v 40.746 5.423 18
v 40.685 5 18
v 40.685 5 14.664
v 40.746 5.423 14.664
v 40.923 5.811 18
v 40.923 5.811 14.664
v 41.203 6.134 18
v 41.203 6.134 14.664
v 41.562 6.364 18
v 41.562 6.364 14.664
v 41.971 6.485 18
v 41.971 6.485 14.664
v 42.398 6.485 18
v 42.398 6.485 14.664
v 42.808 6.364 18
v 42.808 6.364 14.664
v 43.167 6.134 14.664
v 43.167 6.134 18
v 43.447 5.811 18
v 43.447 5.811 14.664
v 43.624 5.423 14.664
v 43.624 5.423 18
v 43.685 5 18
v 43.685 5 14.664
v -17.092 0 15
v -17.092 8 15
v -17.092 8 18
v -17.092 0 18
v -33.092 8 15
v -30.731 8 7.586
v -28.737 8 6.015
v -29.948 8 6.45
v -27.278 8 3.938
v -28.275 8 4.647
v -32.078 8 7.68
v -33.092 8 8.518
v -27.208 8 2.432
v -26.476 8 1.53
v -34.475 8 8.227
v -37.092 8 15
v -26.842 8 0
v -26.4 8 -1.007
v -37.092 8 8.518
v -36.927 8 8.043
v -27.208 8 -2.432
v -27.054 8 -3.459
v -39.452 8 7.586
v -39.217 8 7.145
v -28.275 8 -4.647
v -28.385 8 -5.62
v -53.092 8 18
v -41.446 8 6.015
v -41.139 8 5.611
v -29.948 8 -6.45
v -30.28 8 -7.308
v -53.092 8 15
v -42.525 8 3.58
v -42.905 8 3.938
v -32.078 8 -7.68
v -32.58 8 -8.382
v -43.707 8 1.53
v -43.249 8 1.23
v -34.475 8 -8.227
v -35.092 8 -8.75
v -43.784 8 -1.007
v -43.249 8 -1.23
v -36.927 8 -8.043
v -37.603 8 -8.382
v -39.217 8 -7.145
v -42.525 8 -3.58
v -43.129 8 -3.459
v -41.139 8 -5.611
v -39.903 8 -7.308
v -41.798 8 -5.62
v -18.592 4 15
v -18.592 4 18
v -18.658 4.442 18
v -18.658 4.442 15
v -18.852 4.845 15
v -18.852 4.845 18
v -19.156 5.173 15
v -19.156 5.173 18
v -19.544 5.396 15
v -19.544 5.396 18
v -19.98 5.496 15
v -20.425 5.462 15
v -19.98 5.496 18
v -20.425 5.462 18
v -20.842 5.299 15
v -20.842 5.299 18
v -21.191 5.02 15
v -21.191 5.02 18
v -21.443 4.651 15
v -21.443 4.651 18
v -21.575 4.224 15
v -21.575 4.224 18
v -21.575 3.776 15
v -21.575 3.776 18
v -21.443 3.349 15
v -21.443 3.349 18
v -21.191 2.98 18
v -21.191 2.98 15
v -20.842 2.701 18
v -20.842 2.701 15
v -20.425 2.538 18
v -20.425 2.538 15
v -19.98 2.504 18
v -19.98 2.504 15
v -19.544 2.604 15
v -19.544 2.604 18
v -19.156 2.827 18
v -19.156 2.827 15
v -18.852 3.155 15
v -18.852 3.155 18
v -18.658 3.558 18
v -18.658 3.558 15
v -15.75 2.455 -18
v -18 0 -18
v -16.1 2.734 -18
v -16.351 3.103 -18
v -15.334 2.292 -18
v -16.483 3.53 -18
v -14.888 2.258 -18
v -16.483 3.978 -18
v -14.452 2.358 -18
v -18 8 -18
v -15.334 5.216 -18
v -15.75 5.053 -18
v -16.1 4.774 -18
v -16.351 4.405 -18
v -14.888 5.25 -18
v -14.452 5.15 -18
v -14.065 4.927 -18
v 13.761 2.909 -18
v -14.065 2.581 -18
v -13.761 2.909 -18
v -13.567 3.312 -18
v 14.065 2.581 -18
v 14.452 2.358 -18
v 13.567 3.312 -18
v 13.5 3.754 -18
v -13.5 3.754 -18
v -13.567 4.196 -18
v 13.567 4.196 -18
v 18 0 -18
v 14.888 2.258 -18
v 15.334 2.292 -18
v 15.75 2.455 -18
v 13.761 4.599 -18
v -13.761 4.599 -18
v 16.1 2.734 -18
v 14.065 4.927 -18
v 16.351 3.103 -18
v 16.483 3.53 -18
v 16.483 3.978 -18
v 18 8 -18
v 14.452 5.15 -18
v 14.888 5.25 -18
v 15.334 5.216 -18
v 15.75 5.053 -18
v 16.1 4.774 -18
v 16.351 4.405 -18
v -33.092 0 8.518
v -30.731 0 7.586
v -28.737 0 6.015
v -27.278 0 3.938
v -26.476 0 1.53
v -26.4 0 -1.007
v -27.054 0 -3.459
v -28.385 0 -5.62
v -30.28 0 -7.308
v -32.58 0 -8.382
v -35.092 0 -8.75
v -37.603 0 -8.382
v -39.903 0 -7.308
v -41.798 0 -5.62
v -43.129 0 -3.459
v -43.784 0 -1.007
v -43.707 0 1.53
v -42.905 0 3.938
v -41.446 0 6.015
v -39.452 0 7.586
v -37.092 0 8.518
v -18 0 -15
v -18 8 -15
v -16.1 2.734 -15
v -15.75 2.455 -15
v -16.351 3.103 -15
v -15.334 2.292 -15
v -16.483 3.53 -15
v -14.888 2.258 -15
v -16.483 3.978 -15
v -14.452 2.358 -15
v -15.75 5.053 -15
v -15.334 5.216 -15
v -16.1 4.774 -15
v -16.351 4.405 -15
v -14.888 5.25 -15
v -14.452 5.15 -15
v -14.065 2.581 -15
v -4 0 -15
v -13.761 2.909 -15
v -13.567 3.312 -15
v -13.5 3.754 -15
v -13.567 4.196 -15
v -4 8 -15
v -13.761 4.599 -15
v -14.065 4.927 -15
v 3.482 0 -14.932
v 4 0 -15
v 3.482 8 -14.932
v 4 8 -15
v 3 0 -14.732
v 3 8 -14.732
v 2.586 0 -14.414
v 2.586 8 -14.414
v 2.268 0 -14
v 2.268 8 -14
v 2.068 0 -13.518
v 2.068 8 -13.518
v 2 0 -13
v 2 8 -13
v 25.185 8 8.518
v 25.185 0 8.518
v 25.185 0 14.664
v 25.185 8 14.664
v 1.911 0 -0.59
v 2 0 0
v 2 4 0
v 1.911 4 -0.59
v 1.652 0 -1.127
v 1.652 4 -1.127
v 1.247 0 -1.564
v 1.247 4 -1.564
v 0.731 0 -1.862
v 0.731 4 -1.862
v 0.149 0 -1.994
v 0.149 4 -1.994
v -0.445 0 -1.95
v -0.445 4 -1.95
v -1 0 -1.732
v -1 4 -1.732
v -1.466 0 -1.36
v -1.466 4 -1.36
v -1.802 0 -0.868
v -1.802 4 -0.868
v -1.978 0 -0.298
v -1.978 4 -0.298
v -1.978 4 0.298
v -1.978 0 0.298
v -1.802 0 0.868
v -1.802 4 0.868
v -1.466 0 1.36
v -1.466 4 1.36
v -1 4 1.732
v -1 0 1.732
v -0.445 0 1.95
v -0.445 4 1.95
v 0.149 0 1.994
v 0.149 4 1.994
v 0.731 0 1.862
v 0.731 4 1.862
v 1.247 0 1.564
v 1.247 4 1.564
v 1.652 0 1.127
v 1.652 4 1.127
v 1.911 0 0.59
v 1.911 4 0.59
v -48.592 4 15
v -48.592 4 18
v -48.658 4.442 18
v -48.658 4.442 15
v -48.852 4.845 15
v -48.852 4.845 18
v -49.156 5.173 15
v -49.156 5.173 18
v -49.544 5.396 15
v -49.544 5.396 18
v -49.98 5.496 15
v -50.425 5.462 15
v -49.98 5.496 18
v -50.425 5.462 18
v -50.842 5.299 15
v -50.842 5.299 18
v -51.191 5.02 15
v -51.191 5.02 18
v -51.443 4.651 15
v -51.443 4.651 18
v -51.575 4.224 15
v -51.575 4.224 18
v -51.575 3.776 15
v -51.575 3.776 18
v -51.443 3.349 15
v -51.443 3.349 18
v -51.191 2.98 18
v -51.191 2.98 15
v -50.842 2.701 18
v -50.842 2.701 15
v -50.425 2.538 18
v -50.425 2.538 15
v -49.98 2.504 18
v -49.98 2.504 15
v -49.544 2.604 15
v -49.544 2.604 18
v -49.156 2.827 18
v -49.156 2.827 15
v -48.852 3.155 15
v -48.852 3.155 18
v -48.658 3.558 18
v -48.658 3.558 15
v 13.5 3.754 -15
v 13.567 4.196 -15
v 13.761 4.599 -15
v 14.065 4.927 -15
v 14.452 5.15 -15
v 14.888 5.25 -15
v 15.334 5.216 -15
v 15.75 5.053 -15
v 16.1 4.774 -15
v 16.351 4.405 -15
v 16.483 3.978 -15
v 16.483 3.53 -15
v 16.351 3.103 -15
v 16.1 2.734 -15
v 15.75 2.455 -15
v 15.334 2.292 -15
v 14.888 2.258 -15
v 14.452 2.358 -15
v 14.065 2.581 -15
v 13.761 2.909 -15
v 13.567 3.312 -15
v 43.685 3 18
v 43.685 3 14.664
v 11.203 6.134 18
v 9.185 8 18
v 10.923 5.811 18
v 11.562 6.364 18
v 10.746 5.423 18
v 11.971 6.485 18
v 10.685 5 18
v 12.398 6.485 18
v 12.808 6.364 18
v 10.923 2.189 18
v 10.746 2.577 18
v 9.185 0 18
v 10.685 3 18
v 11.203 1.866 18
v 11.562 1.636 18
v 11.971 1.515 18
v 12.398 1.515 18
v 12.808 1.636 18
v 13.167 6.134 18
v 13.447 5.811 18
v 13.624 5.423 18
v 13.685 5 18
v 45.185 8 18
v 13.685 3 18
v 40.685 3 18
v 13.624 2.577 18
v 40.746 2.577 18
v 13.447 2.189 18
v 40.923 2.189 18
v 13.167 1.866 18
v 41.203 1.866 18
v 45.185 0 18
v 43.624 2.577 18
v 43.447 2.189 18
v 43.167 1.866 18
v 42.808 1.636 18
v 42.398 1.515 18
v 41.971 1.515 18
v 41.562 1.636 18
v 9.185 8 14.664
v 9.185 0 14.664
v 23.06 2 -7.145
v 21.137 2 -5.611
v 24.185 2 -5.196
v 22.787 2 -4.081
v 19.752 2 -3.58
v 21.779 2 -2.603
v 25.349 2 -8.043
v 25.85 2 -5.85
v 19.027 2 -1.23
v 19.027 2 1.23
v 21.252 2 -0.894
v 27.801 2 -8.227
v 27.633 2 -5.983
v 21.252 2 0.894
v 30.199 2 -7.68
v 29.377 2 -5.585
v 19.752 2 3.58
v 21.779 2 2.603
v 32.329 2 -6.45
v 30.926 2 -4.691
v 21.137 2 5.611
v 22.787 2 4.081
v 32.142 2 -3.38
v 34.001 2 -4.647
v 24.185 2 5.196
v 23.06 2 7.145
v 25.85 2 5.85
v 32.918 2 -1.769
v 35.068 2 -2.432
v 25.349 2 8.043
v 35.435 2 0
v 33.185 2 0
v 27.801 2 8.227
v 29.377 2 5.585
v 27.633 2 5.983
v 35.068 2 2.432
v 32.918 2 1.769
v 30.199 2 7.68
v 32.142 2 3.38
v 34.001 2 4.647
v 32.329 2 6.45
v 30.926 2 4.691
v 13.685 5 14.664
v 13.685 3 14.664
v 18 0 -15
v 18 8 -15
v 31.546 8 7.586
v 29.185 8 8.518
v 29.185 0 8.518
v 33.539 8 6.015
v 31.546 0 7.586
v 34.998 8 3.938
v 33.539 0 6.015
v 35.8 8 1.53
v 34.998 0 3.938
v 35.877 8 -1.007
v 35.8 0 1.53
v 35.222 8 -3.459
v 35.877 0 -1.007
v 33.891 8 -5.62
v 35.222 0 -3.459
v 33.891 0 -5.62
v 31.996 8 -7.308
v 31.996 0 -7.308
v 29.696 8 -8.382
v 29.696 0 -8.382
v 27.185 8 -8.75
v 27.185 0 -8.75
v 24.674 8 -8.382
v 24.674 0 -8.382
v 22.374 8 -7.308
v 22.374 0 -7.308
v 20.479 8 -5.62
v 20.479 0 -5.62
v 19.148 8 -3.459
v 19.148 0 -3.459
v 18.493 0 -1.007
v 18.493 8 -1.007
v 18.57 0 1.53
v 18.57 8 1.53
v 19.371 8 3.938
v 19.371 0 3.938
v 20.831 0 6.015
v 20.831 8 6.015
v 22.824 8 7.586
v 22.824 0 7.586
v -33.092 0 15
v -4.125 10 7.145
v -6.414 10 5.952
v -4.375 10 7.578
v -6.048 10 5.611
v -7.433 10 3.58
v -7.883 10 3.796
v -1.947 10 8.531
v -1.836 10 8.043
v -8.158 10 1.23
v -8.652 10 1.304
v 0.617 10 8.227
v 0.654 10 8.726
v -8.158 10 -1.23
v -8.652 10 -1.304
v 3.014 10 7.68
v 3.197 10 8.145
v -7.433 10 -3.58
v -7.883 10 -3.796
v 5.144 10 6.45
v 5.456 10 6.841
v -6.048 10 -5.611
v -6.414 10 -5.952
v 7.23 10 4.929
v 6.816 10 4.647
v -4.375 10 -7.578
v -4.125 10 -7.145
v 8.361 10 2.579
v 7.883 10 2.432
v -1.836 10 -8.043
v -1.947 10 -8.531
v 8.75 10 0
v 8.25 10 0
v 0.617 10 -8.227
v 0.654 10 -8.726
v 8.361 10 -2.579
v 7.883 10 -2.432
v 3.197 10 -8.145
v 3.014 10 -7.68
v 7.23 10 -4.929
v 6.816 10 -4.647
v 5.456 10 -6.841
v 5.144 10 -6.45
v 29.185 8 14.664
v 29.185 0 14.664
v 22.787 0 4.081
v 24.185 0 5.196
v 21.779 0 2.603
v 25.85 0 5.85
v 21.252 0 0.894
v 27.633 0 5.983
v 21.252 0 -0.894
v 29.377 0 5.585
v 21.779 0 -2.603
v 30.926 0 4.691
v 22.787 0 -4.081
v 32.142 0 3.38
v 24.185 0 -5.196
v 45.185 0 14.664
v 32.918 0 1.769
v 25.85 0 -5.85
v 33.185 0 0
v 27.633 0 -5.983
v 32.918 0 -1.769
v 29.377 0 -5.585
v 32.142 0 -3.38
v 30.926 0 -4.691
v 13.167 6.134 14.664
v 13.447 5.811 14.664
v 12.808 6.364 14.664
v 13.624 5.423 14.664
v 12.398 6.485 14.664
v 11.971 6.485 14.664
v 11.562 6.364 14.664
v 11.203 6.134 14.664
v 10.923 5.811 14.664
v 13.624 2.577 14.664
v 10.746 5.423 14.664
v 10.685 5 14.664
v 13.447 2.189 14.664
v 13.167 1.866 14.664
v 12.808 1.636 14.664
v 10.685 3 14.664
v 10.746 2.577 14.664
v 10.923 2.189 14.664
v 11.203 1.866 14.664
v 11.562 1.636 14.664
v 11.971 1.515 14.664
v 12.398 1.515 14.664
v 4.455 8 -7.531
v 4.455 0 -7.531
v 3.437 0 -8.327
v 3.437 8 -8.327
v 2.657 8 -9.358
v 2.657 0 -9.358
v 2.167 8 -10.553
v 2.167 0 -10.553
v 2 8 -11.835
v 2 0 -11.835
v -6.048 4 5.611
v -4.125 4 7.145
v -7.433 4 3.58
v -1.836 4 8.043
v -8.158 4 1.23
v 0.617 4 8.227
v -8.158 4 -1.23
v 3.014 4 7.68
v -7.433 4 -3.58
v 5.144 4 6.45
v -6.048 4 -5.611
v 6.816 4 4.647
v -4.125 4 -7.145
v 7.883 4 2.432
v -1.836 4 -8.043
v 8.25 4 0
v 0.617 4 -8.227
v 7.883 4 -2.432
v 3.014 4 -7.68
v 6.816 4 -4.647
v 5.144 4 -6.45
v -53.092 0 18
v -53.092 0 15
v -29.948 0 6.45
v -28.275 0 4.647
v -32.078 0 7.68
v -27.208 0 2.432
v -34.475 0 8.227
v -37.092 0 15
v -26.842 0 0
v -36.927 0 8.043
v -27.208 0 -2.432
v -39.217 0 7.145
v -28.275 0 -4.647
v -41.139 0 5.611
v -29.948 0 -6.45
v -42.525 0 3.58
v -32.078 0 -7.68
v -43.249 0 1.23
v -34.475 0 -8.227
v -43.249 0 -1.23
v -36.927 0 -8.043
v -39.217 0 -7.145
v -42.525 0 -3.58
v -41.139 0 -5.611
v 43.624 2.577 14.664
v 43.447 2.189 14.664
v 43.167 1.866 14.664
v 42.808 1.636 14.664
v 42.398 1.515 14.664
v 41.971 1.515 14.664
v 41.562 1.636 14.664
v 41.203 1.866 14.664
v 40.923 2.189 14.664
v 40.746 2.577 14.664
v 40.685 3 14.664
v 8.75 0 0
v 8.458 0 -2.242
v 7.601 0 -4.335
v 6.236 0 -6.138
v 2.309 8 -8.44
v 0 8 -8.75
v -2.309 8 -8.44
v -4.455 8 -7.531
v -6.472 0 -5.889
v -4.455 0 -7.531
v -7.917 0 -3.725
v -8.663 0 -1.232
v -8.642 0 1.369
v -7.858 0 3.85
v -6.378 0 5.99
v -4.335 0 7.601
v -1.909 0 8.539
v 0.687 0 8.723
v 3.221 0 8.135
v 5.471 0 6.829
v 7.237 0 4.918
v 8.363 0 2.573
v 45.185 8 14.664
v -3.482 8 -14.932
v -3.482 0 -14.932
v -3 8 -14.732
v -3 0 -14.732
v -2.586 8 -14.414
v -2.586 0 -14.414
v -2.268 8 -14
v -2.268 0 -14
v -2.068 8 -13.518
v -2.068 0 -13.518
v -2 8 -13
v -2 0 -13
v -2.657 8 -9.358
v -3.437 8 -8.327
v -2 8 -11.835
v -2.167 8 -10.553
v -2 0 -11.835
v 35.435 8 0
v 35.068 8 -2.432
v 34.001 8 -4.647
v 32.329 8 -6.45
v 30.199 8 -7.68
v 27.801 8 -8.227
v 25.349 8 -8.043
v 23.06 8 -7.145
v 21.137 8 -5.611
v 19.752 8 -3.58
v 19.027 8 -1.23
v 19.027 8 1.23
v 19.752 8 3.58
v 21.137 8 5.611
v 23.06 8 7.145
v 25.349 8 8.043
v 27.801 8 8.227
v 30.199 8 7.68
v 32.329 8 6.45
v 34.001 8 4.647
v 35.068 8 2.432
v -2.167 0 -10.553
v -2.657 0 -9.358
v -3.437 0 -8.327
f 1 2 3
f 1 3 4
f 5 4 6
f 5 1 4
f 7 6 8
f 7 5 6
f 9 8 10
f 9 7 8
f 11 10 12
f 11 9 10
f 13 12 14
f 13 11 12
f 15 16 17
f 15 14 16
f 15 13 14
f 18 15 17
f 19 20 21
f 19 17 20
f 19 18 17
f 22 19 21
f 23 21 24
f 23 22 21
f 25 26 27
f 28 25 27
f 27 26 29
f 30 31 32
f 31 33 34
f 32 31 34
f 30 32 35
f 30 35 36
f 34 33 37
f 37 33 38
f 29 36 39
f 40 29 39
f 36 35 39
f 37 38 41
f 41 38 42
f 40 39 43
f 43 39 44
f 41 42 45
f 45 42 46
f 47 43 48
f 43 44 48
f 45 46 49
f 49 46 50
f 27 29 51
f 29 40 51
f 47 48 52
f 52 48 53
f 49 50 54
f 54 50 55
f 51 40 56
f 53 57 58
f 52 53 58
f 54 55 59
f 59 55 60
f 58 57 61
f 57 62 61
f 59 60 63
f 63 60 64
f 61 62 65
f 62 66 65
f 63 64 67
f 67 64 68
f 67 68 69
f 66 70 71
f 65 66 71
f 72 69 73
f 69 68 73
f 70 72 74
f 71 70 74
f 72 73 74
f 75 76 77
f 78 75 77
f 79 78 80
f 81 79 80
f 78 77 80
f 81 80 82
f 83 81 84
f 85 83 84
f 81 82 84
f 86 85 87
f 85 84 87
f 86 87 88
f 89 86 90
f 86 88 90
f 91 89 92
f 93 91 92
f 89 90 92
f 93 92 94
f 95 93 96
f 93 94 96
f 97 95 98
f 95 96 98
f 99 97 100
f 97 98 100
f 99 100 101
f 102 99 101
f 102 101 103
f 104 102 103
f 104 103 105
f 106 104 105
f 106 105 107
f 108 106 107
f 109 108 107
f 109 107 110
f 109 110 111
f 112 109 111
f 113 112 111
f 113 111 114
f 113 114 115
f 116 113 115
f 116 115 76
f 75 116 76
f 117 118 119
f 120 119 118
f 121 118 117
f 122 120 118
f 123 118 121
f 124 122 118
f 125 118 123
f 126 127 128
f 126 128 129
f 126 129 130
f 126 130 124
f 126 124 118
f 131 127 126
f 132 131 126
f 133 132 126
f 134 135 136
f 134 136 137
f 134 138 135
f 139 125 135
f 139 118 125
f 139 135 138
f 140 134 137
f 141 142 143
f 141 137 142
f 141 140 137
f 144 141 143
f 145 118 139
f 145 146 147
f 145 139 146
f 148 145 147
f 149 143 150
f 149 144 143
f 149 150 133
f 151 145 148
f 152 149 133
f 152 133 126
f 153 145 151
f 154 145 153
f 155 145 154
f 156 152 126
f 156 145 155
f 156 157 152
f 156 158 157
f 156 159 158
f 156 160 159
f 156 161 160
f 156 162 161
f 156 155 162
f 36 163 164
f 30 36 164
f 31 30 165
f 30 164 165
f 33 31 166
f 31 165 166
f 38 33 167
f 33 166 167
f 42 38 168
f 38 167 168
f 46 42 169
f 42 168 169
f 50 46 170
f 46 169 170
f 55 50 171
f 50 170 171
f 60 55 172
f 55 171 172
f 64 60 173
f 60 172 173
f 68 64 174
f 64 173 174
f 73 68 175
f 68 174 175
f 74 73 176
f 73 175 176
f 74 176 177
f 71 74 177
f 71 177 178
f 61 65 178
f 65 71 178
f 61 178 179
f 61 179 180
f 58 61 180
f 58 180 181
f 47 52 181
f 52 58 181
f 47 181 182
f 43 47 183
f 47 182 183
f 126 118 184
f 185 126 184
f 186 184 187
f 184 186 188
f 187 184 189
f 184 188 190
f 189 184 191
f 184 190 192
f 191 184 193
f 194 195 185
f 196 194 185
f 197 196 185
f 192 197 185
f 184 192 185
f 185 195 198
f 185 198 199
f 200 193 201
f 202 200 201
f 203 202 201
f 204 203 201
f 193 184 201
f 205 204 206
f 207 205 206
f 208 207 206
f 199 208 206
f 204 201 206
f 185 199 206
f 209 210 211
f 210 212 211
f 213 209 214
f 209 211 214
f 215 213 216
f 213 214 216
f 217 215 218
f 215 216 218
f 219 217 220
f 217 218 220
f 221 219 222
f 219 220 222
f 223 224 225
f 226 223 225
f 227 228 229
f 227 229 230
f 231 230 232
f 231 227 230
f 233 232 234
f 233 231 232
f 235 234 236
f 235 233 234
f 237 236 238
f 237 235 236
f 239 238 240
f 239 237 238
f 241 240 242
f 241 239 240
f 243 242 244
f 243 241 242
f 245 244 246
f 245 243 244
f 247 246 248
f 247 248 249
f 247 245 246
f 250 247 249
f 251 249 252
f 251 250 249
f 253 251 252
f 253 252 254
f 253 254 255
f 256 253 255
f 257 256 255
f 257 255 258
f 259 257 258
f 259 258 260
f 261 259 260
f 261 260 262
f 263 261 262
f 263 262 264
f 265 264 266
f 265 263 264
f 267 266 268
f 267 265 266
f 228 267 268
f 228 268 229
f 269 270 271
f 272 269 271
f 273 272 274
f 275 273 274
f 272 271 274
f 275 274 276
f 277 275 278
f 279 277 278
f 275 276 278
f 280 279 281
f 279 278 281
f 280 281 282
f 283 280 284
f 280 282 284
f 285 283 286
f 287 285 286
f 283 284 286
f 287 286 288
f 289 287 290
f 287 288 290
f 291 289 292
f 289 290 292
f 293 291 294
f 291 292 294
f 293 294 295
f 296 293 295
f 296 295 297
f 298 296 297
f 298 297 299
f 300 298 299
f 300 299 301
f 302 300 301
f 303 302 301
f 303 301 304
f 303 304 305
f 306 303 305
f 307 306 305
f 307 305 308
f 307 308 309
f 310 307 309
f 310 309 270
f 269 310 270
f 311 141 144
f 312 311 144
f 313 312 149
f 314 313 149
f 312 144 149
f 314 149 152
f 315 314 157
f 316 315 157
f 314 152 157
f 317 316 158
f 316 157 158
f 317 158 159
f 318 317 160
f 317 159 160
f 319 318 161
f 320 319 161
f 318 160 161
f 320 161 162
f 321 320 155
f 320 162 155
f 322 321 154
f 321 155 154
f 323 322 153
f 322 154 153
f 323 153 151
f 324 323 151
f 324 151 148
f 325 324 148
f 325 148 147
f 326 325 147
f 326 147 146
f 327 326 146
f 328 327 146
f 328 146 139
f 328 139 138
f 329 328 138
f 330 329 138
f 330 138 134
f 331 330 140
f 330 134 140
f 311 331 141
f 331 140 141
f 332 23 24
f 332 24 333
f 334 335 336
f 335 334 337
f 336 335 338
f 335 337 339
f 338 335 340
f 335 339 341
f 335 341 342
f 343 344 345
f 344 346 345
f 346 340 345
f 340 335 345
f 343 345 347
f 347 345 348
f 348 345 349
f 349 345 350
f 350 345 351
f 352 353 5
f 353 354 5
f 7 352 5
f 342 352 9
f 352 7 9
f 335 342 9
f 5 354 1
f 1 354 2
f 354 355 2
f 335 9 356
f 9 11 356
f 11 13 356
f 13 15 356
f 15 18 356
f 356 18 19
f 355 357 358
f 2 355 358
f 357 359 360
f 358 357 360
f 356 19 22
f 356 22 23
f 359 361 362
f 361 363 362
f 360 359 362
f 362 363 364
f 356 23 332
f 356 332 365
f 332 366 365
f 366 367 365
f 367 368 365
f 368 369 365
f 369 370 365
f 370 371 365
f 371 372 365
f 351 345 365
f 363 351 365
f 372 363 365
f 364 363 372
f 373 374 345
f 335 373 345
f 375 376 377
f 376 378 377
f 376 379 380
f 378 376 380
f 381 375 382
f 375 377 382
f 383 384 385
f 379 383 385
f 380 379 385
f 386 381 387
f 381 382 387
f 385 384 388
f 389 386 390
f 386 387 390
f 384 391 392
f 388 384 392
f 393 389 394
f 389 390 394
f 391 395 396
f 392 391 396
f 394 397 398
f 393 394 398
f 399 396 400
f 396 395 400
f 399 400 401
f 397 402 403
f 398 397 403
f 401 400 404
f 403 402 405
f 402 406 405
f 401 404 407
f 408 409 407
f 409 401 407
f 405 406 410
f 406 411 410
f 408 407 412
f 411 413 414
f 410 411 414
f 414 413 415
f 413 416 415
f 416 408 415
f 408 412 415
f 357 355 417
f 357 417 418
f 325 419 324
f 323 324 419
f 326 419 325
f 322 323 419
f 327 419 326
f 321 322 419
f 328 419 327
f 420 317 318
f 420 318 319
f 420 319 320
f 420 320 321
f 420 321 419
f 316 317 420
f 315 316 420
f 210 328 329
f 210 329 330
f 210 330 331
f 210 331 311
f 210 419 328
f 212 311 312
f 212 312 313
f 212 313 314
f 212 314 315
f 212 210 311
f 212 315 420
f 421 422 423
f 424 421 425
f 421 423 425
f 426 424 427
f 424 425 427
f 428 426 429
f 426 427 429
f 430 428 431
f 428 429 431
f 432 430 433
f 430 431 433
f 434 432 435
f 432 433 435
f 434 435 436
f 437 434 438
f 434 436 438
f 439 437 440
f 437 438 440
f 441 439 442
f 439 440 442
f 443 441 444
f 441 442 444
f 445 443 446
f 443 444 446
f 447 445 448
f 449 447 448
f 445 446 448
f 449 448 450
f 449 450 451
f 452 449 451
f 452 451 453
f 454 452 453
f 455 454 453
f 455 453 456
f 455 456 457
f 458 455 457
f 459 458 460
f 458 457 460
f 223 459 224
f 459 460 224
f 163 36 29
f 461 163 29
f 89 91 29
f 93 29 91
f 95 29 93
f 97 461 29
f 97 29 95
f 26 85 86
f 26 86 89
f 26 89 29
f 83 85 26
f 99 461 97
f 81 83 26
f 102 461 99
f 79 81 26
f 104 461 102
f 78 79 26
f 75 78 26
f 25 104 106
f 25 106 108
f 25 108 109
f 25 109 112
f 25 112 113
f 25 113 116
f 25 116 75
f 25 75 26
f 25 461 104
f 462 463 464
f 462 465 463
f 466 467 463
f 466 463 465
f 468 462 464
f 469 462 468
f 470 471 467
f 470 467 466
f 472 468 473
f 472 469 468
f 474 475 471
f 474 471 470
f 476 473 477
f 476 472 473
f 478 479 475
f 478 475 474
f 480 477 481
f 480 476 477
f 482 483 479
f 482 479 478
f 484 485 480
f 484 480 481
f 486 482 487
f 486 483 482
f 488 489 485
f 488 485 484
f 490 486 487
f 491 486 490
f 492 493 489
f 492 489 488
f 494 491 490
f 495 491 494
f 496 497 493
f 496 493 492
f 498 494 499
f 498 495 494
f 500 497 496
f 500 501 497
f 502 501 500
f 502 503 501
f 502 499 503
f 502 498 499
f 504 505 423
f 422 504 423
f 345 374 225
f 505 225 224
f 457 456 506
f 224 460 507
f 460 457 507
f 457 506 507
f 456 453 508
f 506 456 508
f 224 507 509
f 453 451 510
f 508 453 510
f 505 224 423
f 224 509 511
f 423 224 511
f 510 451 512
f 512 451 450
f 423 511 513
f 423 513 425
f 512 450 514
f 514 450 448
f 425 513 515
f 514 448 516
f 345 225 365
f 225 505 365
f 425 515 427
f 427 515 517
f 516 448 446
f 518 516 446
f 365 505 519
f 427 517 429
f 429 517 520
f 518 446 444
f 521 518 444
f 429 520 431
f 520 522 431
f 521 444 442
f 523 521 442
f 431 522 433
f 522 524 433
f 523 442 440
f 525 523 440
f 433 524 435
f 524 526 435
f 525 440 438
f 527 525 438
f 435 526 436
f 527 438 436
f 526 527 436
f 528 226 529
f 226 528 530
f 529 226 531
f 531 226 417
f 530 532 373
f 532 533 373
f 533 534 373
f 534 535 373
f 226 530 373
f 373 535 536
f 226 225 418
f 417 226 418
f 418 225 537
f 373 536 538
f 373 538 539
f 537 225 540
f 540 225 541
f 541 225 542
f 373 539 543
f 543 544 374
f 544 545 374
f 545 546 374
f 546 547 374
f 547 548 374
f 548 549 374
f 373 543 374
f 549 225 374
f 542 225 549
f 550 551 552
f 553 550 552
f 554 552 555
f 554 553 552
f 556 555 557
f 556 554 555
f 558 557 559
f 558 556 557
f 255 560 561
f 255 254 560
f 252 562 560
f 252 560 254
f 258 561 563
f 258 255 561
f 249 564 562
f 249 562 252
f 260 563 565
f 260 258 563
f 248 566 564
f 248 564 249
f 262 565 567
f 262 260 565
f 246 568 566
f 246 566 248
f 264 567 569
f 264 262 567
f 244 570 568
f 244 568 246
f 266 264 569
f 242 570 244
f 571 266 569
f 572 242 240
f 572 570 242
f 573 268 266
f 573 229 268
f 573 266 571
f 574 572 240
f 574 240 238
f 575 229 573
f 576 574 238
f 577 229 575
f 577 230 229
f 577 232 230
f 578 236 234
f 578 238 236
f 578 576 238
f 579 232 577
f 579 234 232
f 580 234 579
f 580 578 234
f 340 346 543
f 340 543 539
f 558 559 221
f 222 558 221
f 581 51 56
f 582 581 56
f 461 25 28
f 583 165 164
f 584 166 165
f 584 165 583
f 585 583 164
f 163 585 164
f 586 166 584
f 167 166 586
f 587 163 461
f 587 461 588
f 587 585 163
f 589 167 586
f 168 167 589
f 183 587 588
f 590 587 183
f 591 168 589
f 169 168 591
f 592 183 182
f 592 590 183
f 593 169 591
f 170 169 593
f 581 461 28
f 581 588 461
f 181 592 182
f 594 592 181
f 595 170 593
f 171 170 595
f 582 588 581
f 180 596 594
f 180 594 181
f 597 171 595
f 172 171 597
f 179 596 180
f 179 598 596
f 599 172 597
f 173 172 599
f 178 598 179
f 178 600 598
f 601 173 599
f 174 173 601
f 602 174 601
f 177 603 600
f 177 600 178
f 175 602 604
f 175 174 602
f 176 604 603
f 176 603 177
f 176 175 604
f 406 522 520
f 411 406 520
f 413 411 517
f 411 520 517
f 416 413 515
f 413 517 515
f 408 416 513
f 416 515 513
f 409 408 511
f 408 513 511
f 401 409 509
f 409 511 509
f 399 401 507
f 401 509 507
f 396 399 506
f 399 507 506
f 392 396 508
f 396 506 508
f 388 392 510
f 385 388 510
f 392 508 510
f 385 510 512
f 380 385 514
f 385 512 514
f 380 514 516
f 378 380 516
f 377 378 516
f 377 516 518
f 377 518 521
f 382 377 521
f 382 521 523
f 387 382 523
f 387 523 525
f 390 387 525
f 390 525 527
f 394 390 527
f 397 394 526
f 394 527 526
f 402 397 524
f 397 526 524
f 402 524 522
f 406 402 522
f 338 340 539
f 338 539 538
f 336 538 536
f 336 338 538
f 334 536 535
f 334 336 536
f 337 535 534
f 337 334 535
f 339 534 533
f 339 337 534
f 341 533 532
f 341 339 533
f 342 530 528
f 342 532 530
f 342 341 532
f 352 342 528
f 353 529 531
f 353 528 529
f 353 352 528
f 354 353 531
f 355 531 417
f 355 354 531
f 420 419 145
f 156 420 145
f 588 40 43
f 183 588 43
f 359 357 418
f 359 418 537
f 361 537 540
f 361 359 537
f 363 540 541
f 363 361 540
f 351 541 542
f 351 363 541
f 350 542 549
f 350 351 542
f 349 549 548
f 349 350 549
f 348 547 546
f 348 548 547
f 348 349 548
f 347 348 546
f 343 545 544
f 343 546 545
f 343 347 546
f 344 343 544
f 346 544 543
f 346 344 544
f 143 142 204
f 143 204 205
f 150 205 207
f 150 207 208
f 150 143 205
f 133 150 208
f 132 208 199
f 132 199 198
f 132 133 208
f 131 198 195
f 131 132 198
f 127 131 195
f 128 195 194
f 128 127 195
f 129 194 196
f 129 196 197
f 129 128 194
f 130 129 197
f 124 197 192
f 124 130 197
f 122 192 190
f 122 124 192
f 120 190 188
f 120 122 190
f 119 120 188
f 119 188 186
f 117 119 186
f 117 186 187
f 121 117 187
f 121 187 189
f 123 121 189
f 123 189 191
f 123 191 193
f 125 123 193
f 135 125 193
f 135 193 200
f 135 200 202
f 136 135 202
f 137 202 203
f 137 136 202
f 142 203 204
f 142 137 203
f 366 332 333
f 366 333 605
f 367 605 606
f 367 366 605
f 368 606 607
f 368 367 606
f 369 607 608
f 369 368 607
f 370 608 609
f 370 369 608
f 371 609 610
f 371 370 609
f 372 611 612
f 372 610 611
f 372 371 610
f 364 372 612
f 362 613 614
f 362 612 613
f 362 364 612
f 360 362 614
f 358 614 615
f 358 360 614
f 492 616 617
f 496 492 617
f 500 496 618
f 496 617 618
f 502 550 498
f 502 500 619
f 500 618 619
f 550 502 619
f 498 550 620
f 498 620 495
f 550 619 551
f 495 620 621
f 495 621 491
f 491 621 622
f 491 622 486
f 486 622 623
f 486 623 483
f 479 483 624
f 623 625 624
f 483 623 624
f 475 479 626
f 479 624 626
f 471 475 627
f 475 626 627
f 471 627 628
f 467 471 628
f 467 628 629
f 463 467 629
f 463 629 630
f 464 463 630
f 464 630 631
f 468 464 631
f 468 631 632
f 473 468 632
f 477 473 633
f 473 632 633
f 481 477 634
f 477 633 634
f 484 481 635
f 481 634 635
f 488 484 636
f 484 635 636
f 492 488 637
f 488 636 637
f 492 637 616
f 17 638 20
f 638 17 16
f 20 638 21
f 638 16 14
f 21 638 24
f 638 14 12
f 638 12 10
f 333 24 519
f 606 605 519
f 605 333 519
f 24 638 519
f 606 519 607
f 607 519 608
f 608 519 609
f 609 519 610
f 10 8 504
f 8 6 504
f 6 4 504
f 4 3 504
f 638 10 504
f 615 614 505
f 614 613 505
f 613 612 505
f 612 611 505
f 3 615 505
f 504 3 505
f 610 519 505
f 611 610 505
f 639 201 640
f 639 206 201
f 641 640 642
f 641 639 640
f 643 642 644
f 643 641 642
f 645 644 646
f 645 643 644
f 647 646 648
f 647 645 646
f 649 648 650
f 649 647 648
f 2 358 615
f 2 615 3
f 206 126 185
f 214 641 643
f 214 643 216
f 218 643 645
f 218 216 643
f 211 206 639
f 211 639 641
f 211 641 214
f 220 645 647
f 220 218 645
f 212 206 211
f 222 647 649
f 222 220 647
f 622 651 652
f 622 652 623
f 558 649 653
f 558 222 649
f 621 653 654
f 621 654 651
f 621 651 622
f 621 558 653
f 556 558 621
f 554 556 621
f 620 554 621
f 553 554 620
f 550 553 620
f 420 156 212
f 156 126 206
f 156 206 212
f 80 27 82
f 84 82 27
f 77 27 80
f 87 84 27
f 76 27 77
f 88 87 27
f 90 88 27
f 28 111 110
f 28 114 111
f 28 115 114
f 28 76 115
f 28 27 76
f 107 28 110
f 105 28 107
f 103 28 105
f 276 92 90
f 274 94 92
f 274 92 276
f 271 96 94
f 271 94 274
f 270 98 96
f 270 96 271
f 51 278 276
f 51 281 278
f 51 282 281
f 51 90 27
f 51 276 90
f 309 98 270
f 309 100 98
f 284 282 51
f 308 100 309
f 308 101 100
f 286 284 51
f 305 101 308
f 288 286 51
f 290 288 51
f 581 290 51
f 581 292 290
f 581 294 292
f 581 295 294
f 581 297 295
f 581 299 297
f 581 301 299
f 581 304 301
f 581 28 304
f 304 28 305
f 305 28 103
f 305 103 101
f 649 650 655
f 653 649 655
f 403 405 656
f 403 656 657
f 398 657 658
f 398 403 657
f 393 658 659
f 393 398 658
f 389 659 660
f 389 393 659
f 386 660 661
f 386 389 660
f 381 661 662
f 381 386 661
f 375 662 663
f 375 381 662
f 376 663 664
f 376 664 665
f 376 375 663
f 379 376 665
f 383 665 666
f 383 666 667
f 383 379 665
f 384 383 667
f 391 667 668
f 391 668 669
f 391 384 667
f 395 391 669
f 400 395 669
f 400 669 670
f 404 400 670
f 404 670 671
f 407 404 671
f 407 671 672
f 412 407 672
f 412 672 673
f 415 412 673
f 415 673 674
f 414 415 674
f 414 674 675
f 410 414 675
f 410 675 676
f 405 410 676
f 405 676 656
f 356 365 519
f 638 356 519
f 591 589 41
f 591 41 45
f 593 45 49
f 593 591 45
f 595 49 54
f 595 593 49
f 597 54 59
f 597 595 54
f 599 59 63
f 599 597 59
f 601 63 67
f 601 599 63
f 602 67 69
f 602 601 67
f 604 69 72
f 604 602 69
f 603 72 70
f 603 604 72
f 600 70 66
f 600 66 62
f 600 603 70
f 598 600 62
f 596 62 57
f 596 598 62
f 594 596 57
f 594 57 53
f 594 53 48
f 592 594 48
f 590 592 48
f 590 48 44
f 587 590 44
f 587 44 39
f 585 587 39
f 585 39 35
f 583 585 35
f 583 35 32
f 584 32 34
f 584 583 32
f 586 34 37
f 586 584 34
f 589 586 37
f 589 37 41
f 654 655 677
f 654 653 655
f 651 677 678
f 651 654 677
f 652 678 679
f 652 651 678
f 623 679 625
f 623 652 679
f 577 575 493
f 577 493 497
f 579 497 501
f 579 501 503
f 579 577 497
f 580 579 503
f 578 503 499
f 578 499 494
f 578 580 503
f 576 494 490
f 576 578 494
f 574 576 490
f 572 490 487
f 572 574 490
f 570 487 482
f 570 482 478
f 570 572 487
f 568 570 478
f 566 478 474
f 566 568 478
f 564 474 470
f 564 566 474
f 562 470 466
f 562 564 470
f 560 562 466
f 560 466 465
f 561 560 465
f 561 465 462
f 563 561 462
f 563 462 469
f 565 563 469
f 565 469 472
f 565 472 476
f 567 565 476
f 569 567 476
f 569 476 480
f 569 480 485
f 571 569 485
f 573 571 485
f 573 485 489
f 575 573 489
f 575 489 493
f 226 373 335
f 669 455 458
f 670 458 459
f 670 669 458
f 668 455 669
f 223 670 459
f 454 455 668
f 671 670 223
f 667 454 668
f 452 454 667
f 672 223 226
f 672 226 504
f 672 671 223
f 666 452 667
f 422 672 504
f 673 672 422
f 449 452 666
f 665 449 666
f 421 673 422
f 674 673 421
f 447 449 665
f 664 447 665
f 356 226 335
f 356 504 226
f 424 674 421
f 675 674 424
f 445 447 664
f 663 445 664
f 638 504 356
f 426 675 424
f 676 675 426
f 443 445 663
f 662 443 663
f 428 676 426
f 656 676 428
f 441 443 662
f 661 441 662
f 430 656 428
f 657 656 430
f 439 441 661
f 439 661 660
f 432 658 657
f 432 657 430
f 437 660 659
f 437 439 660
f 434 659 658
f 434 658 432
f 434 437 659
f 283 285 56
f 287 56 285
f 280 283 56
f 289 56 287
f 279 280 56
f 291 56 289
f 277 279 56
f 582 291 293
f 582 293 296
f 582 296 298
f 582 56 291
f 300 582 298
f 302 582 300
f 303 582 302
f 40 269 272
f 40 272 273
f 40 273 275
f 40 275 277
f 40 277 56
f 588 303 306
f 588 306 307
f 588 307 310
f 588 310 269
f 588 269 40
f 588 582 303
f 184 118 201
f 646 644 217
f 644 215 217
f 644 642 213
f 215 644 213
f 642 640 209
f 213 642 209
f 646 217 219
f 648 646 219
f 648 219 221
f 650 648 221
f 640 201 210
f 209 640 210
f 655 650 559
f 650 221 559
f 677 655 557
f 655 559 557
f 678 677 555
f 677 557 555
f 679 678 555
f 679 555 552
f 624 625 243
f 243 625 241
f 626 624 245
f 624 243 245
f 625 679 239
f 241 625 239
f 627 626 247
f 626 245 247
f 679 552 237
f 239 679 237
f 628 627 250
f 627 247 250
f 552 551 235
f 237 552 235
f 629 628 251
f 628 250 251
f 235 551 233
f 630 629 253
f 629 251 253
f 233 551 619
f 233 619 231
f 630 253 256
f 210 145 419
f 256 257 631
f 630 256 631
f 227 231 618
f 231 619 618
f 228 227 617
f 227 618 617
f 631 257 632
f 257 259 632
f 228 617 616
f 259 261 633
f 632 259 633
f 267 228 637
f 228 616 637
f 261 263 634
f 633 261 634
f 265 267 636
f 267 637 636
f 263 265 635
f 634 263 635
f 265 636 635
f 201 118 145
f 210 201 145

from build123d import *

# Parameters (mm, degrees)
SKETCH_1_R          = 8.75
SKETCH_1_R_2        = 8.25
EXTRUDE_2_DEPTH     = 10
SKETCH_2_R          = 8.25
SKETCH_2_R_2        = 2
EXTRUDE_3_DEPTH     = 4
EXTRUDE_4_DEPTH     = 8
SKETCH_5_W          = 3
SKETCH_5_H          = 8
EXTRUDE_5_DEPTH     = 3
SKETCH_6_W          = 3
SKETCH_6_H          = 8
EXTRUDE_6_DEPTH     = 3
SKETCH_7_R          = 1.5
CUT_EXTRUDE_1_DEPTH = 3
FILLET_1_R          = 5
FILLET_3_R          = 2
SKETCH_8_R          = 8.75
SKETCH_8_R_2        = 8.25
EXTRUDE_7_DEPTH     = 8
SKETCH_9_R          = 8.25
SKETCH_9_R_2        = 6
EXTRUDE_8_DEPTH     = 2
EXTRUDE_9_DEPTH     = 8
SKETCH_11_R         = 1.5
CUT_EXTRUDE_2_DEPTH = 8
CUT_EXTRUDE_3_DEPTH = 8
CUT_EXTRUDE_4_DEPTH = 8
SKETCH_14_R         = 8.75
SKETCH_14_R_2       = 8.25
EXTRUDE_10_DEPTH    = 8
EXTRUDE_11_DEPTH    = 8
SKETCH_16_R         = 1.5
CUT_EXTRUDE_5_DEPTH = 8


with BuildPart() as part:
    # 草图1 → 凸台-拉伸2 (new body)
    with BuildSketch(Plane(origin=(0, 0, 0), x_dir=(1, 0, 0), z_dir=(0, 1, 0))):
        Circle(SKETCH_1_R)
        Circle(SKETCH_1_R_2, mode=Mode.SUBTRACT)
    extrude(amount=EXTRUDE_2_DEPTH)

    # 草图2 → 凸台-拉伸3 (add)
    with BuildSketch(Plane(origin=(0, 0, 0), x_dir=(1, 0, 0), z_dir=(0, 1, 0))):
        Circle(SKETCH_2_R)
        Circle(SKETCH_2_R_2, mode=Mode.SUBTRACT)
    extrude(amount=EXTRUDE_3_DEPTH)

    # 草图3 → 凸台-拉伸4 (add)
    with BuildSketch(Plane(origin=(0, 0, 0), x_dir=(1, 0, 0), z_dir=(0, 1, 0))):
        Polygon((-2, 8.518362519), (2, 8.518362519), (2, 15), (15, 15), (15, 18), (2, 18), (-2, 18), (-15, 18), (-15, 15), (-2, 15), align=None)
    extrude(amount=EXTRUDE_4_DEPTH)

    # 草图5 → 凸台-拉伸5 (add)
    with BuildSketch(Plane(origin=(15, 0, 0), x_dir=(0, 0, -1), z_dir=(1, 0, 0))):
        with Locations((16.5, 4)):
            Rectangle(SKETCH_5_W, SKETCH_5_H)
    extrude(amount=EXTRUDE_5_DEPTH)

    # 草图6 → 凸台-拉伸6 (add)
    with BuildSketch(Plane.ZY.offset(15)):
        with Locations((-16.5, 4)):
            Rectangle(SKETCH_6_W, SKETCH_6_H)
    extrude(amount=EXTRUDE_6_DEPTH)

    # 草图7 → 切除-拉伸1 (cut)
    with BuildSketch(Plane(origin=(0, 0, -18), x_dir=(-1, 0, 0), z_dir=(0, 0, -1))):
        with Locations((-15, 3.754021035)):
            Circle(SKETCH_7_R)
    cut_extrude_1 = extrude(amount=-CUT_EXTRUDE_1_DEPTH, mode=Mode.SUBTRACT)

    # 镜向1: 切除-拉伸1 across plane
    add(cut_extrude_1.mirror(Plane(origin=(0, 0, 0), x_dir=(0, 0, 1), z_dir=(1, 0, 0))), mode=Mode.SUBTRACT)

    # 圆角1
    fillet_1_edges = [part.edges().sort_by_distance(p)[0] for p in [
        (-2, 4, -8.518362519),
        (2, 4, -8.518362519),
    ]]
    fillet(fillet_1_edges, radius=FILLET_1_R)

    # 圆角3
    fillet_3_edges = [part.edges().sort_by_distance(p)[0] for p in [
        (-2, 4, -15),
        (2, 4, -15),
    ]]
    fillet(fillet_3_edges, radius=FILLET_3_R)


with BuildPart() as body_2:
    # 草图8 → 凸台-拉伸7 (new body)
    with BuildSketch(Plane(origin=(0, 0, 0), x_dir=(1, 0, 0), z_dir=(0, 1, 0))):
        with Locations((27.184954533, 0)):
            Circle(SKETCH_8_R)
        with Locations((27.184954533, 0)):
            Circle(SKETCH_8_R_2, mode=Mode.SUBTRACT)
    extrude(amount=EXTRUDE_7_DEPTH)

    # 草图9 → 凸台-拉伸8 (add)
    with BuildSketch(Plane.XZ):
        with Locations((27.184954533, 0)):
            Circle(SKETCH_9_R)
        with Locations((27.184954533, 0)):
            Circle(SKETCH_9_R_2, mode=Mode.SUBTRACT)
    extrude(amount=-EXTRUDE_8_DEPTH)

    # 草图10 → 凸台-拉伸9 (add)
    with BuildSketch(Plane(origin=(0, 0, 0), x_dir=(1, 0, 0), z_dir=(0, 1, 0))):
        Polygon((27.184954533, -18), (45.184954533, -18), (45.184954533, -14.663867829), (29.184954533, -14.663867829), (29.184954533, -8.518362519), (25.184954533, -8.518362519), (25.184954533, -14.663867829), (9.184954533, -14.663867829), (9.184954533, -18), align=None)
    extrude(amount=EXTRUDE_9_DEPTH)

    # 草图11 → 切除-拉伸2 (cut)
    with BuildSketch(Plane.XY.offset(18)):
        with Locations((12.184954533, 4)):
            Circle(SKETCH_11_R)
        with Locations((42.184954533, 4)):
            Circle(SKETCH_11_R)
    extrude(amount=-CUT_EXTRUDE_2_DEPTH, mode=Mode.SUBTRACT)

    # 草图12 → 切除-拉伸3 (cut)
    with BuildSketch(Plane.XY.offset(18)):
        with BuildLine():
            Line((10.684954533, 4), (10.684954533, 5))
            ThreePointArc((10.684954533, 5), (12.184954533, 6.5), (13.684954533, 5))
            Line((13.684954533, 5), (13.684954533, 4))
            Line((13.684954533, 4), (13.684954533, 3))
            ThreePointArc((13.684954533, 3), (12.184954533, 1.5), (10.684954533, 3))
            Line((10.684954533, 3), (10.684954533, 4))
        make_face()
    extrude(amount=-CUT_EXTRUDE_3_DEPTH, mode=Mode.SUBTRACT)

    # 草图13 → 切除-拉伸4 (cut)
    with BuildSketch(Plane.XY.offset(18)):
        with BuildLine():
            Line((40.684954533, 4), (40.684954533, 5))
            ThreePointArc((40.684954533, 5), (42.184954533, 6.5), (43.684954533, 5))
            Line((43.684954533, 5), (43.684954533, 4))
            Line((43.684954533, 4), (43.684954533, 3))
            ThreePointArc((43.684954533, 3), (42.184954533, 1.5), (40.684954533, 3))
            Line((40.684954533, 3), (40.684954533, 4))
        make_face()
    extrude(amount=-CUT_EXTRUDE_4_DEPTH, mode=Mode.SUBTRACT)


with BuildPart() as body_3:
    # 草图14 → 凸台-拉伸10 (new body)
    with BuildSketch(Plane(origin=(0, 0, 0), x_dir=(1, 0, 0), z_dir=(0, 1, 0))):
        with Locations((-35.091635024, 0)):
            Circle(SKETCH_14_R)
        with Locations((-35.091635024, 0)):
            Circle(SKETCH_14_R_2, mode=Mode.SUBTRACT)
    extrude(amount=EXTRUDE_10_DEPTH)

    # 草图15 → 凸台-拉伸11 (add)
    with BuildSketch(Plane(origin=(0, 0, 0), x_dir=(1, 0, 0), z_dir=(0, 1, 0))):
        Polygon((-37.091635024, -15), (-37.091635024, -8.518362519), (-33.091635024, -8.518362519), (-33.091635024, -15), (-17.091635024, -15), (-17.091635024, -18), (-53.091635024, -18), (-53.091635024, -15), align=None)
    extrude(amount=EXTRUDE_11_DEPTH)

    # 草图16 → 切除-拉伸5 (cut)
    with BuildSketch(Plane.XY.offset(18)):
        with Locations((-50.091635024, 4)):
            Circle(SKETCH_16_R)
        with Locations((-20.091635024, 4)):
            Circle(SKETCH_16_R)
    extrude(amount=-CUT_EXTRUDE_5_DEPTH, mode=Mode.SUBTRACT)


solid = Compound([part.part, body_2.part, body_3.part])
